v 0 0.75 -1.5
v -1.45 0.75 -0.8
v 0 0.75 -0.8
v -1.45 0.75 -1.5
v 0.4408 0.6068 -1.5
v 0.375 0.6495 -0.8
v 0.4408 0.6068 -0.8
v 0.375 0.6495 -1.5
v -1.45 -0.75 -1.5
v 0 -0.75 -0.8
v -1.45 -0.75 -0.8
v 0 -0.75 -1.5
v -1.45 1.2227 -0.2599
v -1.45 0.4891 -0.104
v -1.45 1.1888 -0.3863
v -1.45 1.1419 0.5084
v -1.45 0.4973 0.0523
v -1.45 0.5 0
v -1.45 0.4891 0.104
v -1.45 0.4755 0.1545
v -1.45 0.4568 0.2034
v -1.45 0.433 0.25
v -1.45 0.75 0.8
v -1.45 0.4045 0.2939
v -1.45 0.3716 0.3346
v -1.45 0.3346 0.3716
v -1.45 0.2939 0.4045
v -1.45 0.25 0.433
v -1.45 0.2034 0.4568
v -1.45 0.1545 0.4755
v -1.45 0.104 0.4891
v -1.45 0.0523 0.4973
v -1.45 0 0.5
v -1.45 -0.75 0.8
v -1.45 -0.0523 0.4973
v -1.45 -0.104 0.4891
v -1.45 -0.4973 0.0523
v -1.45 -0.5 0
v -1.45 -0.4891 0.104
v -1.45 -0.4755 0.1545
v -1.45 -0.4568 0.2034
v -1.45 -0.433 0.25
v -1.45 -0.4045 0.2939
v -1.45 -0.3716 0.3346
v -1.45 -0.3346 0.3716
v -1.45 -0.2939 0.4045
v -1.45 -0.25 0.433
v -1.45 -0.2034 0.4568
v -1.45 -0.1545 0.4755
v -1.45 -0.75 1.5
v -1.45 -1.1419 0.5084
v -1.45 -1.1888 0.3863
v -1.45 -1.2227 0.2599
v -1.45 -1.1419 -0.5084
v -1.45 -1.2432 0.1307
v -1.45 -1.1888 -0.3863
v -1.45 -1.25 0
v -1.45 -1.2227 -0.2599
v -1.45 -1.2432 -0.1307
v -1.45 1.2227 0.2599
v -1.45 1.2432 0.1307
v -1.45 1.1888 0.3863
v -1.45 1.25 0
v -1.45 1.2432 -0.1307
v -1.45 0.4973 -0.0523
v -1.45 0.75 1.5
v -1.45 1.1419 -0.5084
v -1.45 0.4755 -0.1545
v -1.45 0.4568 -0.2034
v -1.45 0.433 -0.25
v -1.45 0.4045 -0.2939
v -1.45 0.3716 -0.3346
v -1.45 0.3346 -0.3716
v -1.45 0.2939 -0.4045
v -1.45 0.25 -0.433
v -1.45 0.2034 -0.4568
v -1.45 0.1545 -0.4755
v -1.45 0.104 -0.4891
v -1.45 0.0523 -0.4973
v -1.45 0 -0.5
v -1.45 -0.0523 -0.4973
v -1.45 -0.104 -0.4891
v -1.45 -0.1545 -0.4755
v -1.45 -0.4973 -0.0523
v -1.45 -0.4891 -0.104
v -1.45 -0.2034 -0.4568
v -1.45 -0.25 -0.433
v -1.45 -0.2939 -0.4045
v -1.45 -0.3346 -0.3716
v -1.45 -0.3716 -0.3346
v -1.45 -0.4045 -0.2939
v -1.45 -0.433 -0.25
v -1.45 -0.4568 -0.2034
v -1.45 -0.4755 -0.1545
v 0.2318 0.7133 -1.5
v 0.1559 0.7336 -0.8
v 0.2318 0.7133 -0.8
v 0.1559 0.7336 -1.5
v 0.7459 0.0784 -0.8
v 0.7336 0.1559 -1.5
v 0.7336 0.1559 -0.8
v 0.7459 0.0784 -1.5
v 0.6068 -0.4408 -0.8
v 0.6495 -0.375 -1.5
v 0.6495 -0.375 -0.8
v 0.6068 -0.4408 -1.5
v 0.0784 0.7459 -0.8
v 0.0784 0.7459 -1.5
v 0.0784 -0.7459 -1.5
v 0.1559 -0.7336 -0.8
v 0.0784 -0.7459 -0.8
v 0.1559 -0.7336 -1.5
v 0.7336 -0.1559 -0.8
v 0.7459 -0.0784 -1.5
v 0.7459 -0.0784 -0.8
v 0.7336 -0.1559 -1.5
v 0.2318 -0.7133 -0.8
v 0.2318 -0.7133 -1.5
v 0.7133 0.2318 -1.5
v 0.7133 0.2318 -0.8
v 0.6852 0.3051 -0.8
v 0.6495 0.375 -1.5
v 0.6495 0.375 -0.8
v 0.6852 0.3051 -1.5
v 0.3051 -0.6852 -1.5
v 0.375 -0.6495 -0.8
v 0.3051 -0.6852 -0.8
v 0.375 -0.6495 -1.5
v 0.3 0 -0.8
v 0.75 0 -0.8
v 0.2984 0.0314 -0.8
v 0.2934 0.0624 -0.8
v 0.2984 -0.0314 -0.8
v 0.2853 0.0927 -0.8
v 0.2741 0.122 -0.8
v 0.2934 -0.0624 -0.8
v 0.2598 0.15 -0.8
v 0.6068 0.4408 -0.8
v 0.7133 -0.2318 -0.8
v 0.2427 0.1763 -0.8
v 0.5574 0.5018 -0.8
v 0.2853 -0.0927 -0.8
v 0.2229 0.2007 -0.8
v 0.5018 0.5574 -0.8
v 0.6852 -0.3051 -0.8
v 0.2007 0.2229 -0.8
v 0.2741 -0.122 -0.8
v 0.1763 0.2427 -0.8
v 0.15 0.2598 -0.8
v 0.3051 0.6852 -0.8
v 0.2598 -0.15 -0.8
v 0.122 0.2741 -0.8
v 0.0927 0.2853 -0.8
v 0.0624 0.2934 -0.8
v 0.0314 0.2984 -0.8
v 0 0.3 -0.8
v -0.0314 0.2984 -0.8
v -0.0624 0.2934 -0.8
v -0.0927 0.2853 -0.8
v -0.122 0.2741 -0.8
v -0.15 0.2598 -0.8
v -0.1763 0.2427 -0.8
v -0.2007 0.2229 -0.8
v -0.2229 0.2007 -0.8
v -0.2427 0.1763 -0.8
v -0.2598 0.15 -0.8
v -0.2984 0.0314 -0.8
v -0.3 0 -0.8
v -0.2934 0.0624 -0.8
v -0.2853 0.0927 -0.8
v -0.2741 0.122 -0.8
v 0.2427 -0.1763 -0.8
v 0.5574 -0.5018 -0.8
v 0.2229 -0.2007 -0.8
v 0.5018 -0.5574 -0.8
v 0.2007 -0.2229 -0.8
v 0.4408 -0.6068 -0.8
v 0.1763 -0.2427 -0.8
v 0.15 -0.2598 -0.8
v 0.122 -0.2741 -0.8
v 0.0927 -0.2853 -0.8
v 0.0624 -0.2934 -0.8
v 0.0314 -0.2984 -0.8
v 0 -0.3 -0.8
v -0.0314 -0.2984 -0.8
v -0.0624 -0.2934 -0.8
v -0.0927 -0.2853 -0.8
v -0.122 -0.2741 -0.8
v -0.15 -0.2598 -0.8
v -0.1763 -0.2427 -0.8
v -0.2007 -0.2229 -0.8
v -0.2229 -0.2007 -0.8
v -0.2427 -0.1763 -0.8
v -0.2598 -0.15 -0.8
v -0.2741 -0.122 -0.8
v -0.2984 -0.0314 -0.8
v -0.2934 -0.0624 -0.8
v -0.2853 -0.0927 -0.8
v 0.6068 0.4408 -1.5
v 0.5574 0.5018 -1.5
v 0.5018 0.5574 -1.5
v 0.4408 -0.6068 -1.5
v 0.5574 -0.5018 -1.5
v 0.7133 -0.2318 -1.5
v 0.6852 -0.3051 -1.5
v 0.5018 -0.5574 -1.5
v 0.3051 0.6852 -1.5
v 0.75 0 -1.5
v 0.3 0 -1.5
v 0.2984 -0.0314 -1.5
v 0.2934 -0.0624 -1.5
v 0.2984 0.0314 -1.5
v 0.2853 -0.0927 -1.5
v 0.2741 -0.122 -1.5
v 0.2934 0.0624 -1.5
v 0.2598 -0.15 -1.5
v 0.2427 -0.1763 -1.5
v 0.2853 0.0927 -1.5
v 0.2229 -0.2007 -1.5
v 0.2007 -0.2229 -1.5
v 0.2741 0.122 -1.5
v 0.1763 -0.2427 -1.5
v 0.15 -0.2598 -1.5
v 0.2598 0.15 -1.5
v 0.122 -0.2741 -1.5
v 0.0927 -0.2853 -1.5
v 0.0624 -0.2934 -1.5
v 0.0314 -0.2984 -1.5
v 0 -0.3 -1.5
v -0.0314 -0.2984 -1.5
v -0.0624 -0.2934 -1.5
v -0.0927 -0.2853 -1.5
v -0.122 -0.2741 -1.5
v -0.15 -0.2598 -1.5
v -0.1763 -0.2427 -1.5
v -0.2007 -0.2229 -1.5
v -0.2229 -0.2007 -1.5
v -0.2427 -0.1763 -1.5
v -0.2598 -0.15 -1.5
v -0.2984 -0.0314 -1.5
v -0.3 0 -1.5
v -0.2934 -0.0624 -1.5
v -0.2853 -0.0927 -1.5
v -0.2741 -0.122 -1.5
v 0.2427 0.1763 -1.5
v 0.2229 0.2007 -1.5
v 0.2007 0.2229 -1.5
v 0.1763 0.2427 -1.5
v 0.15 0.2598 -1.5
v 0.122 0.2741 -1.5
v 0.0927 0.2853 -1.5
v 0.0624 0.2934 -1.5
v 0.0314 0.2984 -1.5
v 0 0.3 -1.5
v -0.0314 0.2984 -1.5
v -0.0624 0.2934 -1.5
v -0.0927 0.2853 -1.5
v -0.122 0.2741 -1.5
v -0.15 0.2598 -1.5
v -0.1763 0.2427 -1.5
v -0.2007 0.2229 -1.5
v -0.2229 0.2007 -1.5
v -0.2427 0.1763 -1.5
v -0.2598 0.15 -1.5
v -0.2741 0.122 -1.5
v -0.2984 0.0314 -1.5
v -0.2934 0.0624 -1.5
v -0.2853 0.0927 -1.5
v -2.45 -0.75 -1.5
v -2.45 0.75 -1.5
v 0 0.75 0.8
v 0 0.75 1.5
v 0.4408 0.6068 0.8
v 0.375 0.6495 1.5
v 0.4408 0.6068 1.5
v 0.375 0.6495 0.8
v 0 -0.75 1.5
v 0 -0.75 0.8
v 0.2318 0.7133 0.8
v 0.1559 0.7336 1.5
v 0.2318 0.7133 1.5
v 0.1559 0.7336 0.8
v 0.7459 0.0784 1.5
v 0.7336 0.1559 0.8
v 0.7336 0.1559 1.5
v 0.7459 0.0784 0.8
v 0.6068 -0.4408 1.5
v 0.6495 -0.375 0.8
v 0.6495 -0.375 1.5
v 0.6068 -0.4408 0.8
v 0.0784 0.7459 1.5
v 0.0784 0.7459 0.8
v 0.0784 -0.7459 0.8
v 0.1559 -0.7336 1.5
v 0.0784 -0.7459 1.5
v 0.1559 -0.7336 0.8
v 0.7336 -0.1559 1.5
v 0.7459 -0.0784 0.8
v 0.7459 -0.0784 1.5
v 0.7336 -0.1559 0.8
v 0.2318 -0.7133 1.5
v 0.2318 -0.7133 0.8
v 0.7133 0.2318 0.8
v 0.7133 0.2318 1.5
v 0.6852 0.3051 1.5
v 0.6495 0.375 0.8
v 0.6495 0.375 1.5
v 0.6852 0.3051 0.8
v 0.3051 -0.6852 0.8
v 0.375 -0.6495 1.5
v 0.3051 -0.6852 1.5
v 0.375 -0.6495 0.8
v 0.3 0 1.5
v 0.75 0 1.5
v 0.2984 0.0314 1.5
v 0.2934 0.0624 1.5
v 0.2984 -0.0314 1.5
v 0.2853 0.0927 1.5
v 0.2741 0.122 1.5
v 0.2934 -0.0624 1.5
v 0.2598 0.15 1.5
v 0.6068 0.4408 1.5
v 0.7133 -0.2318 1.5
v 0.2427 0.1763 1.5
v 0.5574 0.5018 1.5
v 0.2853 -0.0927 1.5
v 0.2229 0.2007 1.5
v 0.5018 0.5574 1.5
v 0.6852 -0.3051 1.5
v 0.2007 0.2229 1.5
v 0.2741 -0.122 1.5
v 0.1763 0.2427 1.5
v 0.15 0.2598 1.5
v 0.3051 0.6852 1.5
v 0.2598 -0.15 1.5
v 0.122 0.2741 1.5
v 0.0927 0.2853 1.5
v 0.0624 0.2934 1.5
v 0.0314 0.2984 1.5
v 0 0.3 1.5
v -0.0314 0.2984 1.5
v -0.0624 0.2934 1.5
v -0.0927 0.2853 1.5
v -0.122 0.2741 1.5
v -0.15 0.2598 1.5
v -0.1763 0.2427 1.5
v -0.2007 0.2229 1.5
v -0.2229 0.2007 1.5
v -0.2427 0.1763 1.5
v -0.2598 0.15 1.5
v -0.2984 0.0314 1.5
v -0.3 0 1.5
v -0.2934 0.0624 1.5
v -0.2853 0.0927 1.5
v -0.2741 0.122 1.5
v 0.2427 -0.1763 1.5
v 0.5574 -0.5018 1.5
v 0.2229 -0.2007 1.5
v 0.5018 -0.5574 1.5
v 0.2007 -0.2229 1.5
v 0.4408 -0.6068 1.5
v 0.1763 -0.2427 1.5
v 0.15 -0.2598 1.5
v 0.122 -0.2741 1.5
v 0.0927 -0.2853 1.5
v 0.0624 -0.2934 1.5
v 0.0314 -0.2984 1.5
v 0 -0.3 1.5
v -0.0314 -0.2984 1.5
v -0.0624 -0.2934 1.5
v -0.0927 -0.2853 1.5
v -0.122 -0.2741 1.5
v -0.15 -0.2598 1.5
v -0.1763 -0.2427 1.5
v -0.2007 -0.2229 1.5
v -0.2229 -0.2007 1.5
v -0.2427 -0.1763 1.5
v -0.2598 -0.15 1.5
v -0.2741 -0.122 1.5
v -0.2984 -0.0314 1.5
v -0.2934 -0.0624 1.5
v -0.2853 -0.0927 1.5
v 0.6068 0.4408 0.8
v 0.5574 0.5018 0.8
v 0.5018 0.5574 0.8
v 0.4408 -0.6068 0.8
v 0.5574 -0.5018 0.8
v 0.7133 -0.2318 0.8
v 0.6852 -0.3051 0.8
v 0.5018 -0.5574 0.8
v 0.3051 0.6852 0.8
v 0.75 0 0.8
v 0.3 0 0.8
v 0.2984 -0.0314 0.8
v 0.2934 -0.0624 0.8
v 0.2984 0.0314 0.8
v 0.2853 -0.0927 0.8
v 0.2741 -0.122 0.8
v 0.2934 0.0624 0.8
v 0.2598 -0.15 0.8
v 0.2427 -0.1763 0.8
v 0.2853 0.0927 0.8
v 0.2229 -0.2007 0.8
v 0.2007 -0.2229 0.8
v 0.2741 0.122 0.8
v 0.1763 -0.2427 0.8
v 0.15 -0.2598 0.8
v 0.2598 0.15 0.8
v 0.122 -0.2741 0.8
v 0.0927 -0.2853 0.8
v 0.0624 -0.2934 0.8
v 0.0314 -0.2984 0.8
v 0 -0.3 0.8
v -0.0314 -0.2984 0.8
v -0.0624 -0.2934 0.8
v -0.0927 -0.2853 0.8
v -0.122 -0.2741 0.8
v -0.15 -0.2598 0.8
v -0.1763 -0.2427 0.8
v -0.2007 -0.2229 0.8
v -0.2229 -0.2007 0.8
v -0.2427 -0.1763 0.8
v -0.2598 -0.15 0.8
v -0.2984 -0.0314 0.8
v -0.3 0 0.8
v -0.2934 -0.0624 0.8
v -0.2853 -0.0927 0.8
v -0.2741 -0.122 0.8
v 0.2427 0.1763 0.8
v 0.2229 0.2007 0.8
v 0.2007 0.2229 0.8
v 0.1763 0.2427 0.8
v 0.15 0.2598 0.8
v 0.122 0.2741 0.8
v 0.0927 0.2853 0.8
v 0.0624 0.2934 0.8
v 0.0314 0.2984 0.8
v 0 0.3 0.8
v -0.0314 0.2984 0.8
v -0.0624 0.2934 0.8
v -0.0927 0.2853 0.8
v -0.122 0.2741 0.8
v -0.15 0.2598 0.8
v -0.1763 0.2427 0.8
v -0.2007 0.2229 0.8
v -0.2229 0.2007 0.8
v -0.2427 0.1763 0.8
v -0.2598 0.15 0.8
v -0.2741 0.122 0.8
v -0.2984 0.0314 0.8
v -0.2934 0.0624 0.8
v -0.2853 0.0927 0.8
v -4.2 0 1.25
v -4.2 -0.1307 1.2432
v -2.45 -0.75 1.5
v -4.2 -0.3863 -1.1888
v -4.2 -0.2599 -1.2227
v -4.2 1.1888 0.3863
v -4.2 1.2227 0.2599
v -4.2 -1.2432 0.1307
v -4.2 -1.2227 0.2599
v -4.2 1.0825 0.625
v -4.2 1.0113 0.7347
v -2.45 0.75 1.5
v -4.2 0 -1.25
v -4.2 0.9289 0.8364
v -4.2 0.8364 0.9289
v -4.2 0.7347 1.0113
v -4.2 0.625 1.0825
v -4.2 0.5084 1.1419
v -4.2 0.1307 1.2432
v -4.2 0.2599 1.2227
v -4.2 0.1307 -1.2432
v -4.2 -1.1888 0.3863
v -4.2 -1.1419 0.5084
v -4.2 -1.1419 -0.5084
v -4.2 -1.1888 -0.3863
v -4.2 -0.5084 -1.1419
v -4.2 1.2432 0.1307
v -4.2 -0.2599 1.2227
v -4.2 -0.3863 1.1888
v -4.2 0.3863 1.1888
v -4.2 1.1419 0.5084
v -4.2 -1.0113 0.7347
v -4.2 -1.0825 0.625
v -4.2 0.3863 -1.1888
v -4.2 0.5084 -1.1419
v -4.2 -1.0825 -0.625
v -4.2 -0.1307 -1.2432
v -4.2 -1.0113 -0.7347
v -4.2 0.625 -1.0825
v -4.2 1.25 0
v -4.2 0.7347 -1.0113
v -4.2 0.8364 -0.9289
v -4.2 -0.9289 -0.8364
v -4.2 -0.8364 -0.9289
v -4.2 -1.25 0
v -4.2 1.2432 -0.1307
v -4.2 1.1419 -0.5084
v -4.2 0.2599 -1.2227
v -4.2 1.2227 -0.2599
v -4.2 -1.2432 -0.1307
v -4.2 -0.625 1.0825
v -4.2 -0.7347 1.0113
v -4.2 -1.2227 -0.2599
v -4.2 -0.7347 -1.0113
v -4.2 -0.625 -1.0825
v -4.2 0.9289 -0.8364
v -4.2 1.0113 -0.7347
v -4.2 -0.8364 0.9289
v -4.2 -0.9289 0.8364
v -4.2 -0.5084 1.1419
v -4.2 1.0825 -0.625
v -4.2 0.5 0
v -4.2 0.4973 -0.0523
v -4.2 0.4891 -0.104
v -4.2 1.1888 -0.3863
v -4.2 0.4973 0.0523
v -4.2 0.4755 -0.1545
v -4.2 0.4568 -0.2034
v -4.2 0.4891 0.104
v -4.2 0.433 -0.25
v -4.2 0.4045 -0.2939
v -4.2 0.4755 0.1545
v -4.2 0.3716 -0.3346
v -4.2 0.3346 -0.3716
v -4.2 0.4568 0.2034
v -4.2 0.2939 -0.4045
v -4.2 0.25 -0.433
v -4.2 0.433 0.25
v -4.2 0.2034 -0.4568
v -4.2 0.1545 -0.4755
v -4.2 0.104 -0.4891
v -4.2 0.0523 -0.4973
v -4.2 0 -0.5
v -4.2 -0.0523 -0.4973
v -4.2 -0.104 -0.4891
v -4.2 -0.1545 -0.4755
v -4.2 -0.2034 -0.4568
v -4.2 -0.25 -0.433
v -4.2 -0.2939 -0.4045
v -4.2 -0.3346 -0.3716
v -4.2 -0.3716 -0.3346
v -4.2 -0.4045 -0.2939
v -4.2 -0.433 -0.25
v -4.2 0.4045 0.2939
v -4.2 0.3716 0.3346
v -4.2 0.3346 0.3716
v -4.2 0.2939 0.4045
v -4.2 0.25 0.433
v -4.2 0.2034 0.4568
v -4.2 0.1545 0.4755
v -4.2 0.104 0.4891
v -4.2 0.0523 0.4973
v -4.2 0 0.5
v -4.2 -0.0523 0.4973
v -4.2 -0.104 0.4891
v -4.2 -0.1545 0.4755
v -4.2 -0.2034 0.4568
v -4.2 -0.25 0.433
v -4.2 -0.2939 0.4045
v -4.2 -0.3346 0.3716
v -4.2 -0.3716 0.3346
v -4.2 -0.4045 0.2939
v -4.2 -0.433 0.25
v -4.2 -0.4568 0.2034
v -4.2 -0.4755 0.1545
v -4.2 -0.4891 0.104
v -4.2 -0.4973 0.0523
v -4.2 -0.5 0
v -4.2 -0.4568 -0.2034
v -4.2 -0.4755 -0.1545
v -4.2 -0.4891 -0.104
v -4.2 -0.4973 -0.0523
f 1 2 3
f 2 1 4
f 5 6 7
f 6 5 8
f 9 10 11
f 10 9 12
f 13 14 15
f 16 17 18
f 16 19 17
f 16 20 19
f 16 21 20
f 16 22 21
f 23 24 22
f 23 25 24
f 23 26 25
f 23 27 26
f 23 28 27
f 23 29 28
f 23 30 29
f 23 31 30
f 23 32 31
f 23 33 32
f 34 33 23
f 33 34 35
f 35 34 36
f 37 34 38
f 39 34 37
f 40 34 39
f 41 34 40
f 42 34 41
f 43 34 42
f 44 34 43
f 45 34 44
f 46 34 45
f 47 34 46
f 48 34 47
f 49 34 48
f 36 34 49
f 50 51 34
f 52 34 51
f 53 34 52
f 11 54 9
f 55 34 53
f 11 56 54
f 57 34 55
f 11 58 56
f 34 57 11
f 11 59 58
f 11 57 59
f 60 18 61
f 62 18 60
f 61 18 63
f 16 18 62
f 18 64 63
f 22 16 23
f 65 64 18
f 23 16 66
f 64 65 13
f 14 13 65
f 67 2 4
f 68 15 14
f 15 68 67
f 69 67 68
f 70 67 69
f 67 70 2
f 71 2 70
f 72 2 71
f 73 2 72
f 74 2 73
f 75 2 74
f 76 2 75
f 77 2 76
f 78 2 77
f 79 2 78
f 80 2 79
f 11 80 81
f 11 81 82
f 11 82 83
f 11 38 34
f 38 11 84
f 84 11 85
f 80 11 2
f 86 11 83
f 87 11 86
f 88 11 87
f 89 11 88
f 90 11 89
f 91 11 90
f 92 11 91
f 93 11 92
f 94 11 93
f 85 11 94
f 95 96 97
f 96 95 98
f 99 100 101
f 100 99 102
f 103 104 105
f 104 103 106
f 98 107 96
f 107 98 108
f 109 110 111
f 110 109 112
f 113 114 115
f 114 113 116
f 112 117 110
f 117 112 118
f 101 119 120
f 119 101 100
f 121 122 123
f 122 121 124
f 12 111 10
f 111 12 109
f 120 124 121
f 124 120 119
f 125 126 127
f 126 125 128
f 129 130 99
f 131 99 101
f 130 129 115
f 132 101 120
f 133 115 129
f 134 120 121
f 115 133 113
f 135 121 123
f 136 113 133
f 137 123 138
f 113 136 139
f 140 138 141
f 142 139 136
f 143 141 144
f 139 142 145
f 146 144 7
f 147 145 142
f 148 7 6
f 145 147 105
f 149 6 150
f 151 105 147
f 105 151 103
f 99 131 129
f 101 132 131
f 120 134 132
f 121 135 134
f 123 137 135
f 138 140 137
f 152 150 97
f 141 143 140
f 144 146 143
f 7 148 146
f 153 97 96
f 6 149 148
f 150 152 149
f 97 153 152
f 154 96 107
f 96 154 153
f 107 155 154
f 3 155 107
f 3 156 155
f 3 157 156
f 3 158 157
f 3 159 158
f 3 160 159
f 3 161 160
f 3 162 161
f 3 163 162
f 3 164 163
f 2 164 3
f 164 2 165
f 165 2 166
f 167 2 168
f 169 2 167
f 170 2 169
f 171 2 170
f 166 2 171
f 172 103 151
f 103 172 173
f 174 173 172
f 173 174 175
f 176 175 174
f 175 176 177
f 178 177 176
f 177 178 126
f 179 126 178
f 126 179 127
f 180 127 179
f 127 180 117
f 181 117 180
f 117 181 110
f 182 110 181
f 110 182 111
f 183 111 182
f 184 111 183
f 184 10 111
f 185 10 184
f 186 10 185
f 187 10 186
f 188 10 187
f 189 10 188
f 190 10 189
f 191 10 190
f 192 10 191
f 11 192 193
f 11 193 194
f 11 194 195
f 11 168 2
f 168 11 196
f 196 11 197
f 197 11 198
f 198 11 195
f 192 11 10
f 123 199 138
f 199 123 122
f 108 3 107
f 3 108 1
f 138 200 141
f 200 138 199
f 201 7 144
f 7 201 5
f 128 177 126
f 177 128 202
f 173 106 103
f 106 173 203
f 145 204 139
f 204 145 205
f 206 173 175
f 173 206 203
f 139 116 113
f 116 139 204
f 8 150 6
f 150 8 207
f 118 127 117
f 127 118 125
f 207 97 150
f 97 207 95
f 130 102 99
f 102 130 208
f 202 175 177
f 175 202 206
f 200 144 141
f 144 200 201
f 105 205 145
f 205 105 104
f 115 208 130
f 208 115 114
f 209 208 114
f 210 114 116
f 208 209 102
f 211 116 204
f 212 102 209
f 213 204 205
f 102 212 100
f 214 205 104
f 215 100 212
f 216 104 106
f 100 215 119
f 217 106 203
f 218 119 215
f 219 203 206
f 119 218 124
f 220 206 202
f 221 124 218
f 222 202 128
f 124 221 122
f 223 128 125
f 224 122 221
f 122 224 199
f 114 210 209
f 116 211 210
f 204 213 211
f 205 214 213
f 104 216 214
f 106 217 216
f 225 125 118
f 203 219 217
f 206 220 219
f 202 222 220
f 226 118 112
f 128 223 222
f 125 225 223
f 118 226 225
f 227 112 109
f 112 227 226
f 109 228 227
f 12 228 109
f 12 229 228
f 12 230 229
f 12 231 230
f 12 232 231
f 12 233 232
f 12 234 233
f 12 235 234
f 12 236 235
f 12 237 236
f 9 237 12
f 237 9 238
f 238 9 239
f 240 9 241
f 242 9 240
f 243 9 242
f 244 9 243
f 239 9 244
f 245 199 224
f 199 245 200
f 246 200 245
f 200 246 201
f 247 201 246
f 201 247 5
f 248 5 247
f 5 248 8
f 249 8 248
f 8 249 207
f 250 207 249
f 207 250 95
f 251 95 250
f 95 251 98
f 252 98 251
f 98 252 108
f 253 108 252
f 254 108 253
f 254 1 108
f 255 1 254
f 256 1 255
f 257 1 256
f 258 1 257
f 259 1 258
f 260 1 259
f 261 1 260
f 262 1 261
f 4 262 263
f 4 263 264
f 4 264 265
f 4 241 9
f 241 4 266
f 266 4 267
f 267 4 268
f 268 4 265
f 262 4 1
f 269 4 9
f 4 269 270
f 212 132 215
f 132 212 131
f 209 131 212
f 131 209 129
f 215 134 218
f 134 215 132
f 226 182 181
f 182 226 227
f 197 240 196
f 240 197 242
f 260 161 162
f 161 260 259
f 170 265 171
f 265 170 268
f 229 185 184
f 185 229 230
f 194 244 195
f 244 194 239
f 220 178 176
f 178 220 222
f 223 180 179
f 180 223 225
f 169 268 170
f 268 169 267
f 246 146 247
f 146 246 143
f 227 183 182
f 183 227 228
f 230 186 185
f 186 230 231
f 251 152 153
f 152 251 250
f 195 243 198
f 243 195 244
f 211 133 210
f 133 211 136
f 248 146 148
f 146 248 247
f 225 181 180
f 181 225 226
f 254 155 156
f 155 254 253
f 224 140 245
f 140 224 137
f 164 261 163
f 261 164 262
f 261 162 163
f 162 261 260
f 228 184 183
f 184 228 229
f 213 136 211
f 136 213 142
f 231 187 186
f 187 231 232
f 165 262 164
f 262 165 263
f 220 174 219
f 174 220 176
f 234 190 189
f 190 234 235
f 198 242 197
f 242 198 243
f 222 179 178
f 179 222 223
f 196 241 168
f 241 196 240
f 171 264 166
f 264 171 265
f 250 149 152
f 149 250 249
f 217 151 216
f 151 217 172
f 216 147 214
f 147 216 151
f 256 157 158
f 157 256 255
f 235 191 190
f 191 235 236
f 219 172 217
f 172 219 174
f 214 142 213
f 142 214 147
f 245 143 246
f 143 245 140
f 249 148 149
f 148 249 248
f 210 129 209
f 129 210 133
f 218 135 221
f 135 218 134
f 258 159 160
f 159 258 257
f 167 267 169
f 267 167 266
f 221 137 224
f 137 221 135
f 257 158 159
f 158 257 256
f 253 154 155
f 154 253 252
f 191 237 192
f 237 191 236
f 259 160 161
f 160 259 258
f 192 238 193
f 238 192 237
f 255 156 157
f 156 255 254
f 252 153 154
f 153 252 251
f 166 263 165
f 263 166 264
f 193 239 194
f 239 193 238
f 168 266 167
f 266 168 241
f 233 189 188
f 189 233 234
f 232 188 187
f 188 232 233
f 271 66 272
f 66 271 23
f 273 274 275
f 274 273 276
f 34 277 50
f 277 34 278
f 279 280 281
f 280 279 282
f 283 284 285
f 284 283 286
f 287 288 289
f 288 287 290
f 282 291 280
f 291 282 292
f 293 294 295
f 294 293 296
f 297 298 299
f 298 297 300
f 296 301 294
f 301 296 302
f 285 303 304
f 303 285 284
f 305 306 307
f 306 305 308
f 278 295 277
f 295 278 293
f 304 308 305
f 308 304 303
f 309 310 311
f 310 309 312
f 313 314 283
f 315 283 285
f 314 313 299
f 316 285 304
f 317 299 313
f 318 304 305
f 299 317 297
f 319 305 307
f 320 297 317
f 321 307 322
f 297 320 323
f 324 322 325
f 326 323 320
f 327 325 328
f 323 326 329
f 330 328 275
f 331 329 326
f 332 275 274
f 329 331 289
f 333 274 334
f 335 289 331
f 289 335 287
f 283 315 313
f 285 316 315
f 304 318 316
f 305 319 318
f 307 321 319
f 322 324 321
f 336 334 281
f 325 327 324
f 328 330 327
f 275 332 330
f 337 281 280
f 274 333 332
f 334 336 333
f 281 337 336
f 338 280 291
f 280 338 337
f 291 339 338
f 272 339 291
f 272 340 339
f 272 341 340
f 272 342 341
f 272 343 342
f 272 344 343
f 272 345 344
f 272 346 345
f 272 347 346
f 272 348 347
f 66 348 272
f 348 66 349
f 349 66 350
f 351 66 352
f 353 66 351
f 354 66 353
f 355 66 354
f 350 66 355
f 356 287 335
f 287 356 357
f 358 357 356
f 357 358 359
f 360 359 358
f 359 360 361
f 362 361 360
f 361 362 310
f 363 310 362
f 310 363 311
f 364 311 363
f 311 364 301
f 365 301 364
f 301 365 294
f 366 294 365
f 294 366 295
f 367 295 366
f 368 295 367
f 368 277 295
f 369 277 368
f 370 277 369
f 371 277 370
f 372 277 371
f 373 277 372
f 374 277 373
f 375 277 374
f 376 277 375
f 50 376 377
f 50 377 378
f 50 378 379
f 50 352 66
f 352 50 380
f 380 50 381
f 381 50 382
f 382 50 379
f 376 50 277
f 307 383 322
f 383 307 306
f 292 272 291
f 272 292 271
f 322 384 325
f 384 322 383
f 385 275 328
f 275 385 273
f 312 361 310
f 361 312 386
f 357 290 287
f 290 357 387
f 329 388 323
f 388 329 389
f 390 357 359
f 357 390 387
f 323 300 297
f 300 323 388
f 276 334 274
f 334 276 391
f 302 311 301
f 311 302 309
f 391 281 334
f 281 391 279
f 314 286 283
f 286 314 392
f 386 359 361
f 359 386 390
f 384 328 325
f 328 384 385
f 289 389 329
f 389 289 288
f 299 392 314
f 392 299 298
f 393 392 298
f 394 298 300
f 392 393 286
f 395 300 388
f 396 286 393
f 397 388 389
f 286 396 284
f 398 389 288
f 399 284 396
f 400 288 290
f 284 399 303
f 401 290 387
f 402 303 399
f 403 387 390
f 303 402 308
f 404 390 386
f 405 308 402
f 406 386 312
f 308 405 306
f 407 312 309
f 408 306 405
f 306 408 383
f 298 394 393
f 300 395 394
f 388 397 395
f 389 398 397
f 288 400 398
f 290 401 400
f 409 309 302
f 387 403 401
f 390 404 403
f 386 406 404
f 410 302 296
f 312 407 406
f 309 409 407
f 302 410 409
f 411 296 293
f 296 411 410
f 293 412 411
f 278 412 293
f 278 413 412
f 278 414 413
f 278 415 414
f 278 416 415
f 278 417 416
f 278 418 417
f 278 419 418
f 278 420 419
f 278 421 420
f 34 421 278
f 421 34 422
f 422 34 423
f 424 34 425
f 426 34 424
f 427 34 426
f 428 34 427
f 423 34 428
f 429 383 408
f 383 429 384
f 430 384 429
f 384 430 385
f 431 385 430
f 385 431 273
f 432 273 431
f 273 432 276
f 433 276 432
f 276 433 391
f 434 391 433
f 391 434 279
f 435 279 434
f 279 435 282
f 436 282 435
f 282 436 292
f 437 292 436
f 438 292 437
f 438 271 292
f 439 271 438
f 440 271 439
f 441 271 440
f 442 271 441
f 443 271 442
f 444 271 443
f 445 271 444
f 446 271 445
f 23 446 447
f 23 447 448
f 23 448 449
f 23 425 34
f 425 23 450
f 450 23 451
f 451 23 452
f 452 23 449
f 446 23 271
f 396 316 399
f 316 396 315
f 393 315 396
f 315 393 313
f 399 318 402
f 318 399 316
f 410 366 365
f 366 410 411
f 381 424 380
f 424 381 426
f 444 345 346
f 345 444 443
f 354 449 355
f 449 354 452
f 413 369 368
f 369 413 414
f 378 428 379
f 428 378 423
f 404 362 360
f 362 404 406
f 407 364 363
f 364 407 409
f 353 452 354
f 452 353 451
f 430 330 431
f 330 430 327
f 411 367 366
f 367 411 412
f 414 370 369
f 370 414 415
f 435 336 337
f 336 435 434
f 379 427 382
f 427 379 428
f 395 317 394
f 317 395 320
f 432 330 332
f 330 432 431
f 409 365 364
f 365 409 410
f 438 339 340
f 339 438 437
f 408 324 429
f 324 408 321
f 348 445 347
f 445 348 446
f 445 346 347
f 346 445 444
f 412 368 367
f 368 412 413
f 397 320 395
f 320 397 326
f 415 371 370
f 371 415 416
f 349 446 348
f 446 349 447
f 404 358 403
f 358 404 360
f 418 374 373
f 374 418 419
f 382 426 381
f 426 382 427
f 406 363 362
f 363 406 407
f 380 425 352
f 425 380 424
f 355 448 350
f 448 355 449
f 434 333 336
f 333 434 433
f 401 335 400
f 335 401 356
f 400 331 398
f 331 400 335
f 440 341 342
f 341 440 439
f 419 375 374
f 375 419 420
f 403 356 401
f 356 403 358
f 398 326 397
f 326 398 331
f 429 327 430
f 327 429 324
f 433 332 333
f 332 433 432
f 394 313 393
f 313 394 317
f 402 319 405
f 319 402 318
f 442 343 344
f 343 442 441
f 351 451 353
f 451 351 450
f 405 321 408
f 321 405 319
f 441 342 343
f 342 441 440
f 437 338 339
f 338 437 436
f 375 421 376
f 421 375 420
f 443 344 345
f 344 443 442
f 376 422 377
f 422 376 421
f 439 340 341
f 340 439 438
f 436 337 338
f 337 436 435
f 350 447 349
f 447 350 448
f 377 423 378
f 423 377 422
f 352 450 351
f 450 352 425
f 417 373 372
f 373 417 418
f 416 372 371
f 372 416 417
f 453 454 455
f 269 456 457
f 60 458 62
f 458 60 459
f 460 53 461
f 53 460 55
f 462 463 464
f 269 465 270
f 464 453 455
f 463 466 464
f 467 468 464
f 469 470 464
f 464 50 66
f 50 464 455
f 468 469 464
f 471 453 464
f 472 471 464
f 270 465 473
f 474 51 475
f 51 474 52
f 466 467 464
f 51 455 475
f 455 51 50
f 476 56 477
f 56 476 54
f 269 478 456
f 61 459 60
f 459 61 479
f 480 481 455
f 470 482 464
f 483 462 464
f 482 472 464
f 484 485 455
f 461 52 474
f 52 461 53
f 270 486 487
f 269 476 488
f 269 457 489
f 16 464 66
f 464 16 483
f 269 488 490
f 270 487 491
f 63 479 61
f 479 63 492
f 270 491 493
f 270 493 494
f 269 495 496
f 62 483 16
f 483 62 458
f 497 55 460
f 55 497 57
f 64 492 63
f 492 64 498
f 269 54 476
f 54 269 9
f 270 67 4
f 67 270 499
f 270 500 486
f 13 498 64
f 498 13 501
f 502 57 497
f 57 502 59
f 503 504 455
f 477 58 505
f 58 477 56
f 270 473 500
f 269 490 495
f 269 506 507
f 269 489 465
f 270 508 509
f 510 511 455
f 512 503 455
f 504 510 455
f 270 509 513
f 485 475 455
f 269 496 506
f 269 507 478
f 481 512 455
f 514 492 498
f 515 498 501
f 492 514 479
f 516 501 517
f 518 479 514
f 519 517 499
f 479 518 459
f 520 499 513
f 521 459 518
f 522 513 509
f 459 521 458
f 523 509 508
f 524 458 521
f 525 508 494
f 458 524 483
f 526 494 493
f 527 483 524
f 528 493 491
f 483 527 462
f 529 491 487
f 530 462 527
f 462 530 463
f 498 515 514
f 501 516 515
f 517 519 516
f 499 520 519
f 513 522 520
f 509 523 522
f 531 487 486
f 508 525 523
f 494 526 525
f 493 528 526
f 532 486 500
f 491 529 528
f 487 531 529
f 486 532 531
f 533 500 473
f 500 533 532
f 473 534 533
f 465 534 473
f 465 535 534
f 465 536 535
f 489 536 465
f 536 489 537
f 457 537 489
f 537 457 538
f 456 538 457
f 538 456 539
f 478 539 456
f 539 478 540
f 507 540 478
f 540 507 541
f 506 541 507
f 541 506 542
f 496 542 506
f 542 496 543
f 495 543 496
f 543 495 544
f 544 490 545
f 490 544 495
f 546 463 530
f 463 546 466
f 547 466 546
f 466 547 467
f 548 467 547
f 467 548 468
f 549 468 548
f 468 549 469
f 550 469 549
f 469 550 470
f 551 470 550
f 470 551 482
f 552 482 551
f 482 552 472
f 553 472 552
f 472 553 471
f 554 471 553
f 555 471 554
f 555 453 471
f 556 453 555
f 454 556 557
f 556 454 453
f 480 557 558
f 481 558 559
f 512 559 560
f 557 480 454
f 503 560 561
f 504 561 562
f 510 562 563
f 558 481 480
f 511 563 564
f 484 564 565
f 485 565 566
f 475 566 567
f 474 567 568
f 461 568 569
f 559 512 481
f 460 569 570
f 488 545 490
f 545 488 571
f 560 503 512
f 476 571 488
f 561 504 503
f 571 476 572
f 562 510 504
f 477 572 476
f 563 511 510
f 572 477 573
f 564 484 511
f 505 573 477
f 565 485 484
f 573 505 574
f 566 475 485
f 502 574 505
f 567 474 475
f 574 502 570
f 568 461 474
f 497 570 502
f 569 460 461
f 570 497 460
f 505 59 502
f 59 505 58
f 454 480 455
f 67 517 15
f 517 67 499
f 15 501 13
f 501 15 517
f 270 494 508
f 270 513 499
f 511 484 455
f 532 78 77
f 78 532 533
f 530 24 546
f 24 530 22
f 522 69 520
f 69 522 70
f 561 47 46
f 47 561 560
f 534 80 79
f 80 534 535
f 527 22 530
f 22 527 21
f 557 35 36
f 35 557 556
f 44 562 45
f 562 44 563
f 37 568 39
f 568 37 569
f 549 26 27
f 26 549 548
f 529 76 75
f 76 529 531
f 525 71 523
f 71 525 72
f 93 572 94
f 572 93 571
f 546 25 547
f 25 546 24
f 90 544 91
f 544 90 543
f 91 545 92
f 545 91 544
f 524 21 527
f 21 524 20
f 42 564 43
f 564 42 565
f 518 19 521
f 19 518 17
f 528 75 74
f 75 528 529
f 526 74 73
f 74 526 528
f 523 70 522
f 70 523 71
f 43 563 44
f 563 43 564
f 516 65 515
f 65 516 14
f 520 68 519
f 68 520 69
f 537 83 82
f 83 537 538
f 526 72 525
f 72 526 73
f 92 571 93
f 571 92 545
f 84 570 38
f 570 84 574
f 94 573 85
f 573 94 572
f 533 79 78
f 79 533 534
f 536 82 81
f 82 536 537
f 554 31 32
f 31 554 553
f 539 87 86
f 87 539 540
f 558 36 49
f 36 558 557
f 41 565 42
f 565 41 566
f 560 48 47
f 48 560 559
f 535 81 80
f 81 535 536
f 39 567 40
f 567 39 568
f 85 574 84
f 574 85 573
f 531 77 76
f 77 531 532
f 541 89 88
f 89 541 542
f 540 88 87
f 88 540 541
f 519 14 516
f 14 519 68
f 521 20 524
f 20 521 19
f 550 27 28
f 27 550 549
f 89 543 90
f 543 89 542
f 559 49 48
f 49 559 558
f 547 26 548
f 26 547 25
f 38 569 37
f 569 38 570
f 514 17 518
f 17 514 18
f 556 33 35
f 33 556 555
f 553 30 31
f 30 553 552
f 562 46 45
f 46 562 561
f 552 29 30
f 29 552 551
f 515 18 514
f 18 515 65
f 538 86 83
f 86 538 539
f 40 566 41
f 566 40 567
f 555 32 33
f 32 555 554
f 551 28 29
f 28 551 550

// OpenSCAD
bracket();
*connector();

//------------------------------------ settings ------------------------------//
margin = 0.05;

// bracket
shaftDiameter = 1;          // shaft diameter
outerDiameter = 2.5;        // shaft holder outer diameter
shaftLength = 2.75;         // shaft holder length

// arm
armWidth = 1.5;             // y
armHeight = 0.75 - margin;  // z
armLength = armWidth + armHeight;              // x
armDistance = 3;            // distance of arms (end to end)

// connector cube
connectorEdge = armDistance - (2*armHeight) - margin;
connector = [connectorEdge, connectorEdge, connectorEdge];

//------------------------------------ bracket -------------------------------//
module bracket() {
    // set origin into turing point of bracket
    translate([-shaftLength - armLength + (armWidth/2), 0, 0]) {
        difference() {
            // unite shaft and brackets
            union() {
                hull() {
                    // cylinder with shaft
                    rotate([0, 90, 0])
                        cylinder(d = outerDiameter, h = shaftLength, $fn = 60);
                    // arm base to form hull
                    translate([0, -(armWidth)/2, -armDistance/2]) {
                        for(z=[0, armDistance-armHeight]) {
                            translate([shaftLength-1, 0, z])
                                cube([1, armWidth, armHeight]);
                        }
                    }
                }
                // arms
                translate([0, -armWidth/2, -armDistance/2]) {
                    for(z=[0, armDistance-armHeight]) {
                        translate([shaftLength, 0, z]) arm();
                    }
                }
            }
            // shaft hole
            rotate([0, 90, 0])
                cylinder(d = shaftDiameter, h = shaftLength, $fn = 60);
        }
    }
}

module arm() {
    difference() {
        hull() {
            cube([armLength-armWidth, armWidth, armHeight]);
            translate([armLength-(armWidth/2), armWidth/2, 0])
                cylinder(d = armWidth, h = armHeight, $fn = 60);    
        }
        // hole
        translate([armLength-(armWidth/2), armWidth/2, 0])
            cylinder(d = 0.5 + 2*margin, h = armHeight, $fn = 60);
    }
}

//------------------------------------ connector -----------------------------//
module connector() {
    // set origin into center of cube
    translate([-connector.x/2, -connector.y/2, -connector.z/2]) {
        difference() {
            cube(connector);
            // holes
            translate([0, connectorEdge/2, connectorEdge/2]) rotate([0, 90, 0])
                cylinder(d = 0.5+(2*margin), h = connectorEdge, $fn = 60);
            translate([connectorEdge/2, 0, connectorEdge/2]) rotate([-90, 0, 0])
                cylinder(d = 0.5+(2*margin), h = connectorEdge, $fn = 60);
        }
    }

}
